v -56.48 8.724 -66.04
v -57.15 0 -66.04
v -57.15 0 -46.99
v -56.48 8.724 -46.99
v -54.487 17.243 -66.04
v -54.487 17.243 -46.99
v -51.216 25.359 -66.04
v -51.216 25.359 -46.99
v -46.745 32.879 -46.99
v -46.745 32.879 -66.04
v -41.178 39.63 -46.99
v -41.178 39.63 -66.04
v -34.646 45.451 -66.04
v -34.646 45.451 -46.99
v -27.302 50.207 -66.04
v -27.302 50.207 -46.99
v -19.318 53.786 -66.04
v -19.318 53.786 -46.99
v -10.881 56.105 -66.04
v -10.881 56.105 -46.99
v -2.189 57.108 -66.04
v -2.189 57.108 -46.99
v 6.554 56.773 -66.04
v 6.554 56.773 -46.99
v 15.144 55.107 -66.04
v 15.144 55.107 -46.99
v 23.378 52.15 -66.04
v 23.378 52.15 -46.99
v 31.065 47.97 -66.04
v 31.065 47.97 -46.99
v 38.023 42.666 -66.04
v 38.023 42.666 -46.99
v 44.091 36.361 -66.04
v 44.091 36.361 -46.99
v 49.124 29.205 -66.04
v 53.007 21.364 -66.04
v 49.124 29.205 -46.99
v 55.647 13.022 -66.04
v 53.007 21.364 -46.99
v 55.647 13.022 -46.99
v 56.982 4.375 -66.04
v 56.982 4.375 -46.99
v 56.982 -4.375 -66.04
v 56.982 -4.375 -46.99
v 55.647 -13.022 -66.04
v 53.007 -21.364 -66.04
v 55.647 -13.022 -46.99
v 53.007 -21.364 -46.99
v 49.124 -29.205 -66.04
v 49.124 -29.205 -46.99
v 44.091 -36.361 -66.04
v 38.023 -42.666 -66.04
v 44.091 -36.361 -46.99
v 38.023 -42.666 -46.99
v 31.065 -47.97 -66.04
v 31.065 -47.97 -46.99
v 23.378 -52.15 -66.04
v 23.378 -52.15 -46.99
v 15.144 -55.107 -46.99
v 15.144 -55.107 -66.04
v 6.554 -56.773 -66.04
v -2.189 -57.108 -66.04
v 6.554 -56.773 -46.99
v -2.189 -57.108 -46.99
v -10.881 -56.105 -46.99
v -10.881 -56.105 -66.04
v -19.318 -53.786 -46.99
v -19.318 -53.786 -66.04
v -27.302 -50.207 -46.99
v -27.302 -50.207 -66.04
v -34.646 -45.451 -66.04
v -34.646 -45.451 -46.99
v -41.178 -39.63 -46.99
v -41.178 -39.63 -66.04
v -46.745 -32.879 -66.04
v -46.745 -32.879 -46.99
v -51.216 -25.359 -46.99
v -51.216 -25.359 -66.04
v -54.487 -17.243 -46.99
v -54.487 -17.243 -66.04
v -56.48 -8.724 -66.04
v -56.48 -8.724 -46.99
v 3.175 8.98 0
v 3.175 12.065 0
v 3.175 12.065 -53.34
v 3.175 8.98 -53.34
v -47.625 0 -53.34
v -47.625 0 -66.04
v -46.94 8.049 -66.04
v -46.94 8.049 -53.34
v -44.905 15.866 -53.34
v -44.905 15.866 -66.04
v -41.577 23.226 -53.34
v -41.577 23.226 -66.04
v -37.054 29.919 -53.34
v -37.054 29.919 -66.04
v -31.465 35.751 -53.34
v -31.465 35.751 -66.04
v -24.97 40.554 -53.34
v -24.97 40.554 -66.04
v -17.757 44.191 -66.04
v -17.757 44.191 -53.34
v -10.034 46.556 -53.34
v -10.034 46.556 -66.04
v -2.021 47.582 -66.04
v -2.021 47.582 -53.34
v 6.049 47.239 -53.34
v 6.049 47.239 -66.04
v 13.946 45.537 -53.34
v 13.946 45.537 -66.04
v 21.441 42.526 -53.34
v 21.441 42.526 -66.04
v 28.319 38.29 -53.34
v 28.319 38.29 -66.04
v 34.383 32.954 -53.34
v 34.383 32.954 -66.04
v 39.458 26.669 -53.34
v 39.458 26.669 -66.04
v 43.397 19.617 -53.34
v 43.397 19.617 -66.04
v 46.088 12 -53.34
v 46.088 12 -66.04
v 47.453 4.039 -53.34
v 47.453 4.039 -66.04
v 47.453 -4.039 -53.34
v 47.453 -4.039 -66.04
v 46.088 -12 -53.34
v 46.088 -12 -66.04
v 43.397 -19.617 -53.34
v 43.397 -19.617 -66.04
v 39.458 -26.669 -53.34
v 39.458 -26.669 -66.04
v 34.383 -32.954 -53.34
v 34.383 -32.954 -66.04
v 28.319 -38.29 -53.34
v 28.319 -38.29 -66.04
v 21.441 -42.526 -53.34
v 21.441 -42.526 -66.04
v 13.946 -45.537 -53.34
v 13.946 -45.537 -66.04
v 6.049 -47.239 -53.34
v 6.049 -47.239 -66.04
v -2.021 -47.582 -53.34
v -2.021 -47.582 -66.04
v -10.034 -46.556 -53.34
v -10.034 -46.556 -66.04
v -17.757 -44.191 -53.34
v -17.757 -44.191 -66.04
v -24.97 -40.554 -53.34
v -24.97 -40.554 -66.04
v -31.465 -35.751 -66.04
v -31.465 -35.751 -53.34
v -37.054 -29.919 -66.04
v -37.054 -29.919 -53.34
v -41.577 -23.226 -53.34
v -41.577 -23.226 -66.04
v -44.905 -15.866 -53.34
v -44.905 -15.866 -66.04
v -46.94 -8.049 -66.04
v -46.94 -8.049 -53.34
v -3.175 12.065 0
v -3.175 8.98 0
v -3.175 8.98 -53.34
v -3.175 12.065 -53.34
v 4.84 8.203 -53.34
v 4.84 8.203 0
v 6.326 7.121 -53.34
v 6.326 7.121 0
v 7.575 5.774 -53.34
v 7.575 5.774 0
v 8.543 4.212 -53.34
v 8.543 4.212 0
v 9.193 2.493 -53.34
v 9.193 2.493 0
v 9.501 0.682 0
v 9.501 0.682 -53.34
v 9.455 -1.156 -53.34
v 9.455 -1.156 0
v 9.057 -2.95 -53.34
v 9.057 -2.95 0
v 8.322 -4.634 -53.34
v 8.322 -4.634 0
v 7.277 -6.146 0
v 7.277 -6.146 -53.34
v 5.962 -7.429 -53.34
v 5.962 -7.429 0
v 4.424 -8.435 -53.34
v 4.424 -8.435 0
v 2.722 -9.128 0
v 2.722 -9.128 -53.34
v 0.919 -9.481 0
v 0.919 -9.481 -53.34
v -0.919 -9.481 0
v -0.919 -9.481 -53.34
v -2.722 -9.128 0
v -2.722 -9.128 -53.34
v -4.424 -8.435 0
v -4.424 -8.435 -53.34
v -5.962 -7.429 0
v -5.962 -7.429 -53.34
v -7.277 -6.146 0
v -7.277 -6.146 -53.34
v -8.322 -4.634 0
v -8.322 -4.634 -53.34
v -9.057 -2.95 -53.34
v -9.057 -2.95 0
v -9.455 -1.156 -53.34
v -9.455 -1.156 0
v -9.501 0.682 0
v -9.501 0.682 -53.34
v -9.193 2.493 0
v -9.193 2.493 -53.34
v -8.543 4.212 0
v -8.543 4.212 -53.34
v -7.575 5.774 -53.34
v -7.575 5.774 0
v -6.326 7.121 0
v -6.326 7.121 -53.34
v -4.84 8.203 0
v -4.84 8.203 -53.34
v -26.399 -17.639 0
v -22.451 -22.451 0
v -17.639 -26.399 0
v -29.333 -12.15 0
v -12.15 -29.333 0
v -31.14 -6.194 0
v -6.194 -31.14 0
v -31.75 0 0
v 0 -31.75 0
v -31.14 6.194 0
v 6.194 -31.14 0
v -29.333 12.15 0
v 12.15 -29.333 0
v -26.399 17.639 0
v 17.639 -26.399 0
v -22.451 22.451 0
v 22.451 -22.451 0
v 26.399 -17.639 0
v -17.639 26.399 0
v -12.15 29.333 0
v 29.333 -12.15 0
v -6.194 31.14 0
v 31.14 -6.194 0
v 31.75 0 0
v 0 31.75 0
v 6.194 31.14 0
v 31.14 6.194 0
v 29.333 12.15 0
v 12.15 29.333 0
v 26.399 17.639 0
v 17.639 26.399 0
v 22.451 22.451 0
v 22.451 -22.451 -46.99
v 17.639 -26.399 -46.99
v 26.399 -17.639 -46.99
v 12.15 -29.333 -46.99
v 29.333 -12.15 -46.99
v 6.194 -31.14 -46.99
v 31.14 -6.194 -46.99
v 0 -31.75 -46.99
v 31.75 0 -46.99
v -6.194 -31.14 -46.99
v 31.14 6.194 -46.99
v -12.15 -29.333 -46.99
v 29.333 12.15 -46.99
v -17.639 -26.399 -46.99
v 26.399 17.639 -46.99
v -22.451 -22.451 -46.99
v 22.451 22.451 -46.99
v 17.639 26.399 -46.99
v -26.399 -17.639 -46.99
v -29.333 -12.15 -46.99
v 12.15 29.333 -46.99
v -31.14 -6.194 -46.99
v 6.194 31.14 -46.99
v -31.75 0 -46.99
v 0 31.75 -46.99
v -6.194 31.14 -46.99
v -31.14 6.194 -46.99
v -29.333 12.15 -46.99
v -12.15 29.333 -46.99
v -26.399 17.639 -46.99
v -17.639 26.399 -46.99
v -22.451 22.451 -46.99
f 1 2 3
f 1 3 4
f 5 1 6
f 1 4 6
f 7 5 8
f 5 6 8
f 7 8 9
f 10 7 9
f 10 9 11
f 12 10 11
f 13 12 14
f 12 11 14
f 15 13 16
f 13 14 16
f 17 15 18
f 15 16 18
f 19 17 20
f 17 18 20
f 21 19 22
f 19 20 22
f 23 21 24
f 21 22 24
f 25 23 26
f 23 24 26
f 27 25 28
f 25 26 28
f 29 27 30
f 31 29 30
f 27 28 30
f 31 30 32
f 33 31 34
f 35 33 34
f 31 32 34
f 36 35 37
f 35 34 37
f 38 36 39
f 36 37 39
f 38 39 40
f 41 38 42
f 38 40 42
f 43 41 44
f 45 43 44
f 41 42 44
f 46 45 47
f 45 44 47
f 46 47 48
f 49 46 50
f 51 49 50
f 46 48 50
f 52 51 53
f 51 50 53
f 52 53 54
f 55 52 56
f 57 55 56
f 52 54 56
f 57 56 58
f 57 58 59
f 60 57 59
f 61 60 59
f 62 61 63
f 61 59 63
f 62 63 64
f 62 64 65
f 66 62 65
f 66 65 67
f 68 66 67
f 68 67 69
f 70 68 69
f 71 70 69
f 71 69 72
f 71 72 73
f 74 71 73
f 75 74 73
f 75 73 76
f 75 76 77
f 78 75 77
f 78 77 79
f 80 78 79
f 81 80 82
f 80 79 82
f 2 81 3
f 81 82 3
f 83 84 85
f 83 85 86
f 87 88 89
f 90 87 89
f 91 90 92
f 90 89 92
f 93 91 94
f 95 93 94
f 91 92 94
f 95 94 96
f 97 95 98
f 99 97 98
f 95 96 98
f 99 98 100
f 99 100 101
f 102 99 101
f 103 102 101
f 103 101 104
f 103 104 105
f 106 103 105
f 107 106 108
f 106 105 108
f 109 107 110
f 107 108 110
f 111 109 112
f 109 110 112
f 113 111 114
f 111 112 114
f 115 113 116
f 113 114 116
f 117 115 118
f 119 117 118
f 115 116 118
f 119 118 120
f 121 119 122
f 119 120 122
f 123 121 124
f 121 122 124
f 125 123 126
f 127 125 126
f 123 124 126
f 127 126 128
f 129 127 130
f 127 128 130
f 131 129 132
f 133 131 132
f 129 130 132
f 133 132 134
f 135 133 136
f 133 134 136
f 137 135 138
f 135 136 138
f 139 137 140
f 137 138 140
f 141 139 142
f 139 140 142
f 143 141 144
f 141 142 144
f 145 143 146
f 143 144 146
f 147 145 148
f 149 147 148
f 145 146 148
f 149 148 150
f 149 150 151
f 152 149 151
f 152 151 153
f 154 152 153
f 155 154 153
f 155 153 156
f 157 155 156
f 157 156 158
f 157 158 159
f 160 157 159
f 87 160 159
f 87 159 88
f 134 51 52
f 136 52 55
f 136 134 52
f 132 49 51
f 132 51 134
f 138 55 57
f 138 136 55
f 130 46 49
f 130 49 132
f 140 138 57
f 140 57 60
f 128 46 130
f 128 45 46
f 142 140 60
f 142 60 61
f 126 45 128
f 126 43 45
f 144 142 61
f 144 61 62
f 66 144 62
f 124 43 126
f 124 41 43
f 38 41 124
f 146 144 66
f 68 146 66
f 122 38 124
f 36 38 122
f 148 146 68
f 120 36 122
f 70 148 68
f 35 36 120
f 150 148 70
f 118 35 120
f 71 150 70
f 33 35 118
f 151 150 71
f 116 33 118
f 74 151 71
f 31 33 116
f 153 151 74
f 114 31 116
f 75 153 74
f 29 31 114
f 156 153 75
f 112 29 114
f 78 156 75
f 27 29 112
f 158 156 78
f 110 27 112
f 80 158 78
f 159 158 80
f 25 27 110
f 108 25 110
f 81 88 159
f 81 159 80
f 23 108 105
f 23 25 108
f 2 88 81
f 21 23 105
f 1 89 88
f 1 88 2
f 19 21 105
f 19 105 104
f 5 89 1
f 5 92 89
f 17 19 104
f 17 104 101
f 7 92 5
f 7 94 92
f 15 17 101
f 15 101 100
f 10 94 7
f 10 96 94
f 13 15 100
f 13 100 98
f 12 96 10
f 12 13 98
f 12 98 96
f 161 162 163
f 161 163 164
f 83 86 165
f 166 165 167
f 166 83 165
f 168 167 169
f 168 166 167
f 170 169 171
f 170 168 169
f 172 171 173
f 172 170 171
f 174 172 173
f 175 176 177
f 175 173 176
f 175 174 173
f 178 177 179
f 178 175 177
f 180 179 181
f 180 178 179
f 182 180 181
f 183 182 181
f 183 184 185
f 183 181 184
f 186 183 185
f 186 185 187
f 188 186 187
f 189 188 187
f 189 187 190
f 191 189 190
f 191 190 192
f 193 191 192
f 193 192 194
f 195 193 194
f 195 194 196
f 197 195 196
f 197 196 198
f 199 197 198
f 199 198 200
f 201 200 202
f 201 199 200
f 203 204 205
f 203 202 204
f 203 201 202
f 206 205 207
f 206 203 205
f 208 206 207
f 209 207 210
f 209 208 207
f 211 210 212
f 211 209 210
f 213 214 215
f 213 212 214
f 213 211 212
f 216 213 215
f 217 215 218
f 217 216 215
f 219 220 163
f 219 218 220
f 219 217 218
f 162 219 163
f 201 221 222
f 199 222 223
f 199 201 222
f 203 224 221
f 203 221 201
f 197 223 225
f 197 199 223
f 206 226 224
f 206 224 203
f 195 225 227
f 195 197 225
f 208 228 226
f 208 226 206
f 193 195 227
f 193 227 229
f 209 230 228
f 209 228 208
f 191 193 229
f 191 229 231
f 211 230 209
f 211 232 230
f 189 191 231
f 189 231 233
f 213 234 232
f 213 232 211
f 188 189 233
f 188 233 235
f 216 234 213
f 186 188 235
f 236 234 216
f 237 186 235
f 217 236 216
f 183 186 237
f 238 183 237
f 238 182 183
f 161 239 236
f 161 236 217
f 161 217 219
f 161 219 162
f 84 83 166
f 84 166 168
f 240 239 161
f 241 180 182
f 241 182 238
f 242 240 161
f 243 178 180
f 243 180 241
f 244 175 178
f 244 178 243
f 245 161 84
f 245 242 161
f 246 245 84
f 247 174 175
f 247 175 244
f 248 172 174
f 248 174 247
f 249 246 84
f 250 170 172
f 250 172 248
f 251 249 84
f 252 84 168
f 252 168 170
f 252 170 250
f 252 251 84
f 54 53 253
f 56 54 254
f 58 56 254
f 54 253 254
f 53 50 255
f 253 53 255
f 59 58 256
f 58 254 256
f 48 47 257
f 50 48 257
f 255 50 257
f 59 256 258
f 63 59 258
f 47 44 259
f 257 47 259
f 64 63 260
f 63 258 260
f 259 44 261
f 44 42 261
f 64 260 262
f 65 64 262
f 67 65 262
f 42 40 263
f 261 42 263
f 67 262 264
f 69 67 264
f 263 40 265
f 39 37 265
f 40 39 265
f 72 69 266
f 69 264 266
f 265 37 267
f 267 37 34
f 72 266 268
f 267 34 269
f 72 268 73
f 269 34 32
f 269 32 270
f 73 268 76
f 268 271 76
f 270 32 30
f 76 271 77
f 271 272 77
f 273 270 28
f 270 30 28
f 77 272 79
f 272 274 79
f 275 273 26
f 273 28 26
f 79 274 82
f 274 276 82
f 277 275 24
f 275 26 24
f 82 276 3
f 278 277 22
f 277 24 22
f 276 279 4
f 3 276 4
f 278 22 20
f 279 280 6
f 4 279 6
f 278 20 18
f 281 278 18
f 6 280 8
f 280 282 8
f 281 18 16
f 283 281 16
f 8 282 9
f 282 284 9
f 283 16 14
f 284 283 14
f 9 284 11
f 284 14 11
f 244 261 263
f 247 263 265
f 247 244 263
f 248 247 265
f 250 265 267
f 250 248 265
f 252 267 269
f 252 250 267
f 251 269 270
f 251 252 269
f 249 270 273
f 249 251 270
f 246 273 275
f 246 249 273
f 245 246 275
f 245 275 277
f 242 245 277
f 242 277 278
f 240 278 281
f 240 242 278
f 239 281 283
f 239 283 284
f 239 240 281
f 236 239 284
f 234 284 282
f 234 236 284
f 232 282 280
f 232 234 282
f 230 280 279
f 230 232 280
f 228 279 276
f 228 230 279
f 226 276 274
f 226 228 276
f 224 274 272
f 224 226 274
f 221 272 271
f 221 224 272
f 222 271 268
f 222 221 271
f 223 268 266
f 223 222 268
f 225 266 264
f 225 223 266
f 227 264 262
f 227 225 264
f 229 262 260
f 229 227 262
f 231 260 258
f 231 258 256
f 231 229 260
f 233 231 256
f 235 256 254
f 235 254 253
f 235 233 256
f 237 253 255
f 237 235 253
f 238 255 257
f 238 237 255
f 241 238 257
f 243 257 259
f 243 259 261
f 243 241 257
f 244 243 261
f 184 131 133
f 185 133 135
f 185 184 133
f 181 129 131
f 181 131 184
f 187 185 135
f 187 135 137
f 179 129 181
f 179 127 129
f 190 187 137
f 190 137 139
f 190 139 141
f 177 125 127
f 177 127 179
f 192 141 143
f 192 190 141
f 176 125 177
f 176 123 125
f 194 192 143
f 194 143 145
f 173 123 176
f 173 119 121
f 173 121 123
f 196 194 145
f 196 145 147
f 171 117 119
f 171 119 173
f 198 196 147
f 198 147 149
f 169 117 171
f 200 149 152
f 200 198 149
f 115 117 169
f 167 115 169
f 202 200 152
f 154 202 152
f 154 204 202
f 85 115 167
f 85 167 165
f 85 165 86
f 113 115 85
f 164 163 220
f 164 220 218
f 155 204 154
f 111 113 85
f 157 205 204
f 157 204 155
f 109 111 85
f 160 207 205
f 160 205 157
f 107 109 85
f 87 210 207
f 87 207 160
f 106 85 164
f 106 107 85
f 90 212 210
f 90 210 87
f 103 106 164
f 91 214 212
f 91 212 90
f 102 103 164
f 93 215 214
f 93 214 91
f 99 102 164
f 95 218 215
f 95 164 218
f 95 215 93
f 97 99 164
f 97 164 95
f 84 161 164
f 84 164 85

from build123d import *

# Parameters (mm, degrees)
SKETCH1_R           = 31.75
BASE_EXTRUDE_DEPTH  = 46.99
SKETCH2_R           = 57.15
BOSS_EXTRUDE1_DEPTH = 19.05
SKETCH4_R           = 47.625
CUT_EXTRUDE1_DEPTH  = 12.7
CUT_EXTRUDE2_DEPTH  = 105.372058521


with BuildPart() as part:
    # Sketch1 → Base-Extrude (new body)
    with BuildSketch(Plane.XY):
        Circle(SKETCH1_R)
    extrude(amount=-BASE_EXTRUDE_DEPTH)

    # Sketch2 → Boss-Extrude1 (add)
    with BuildSketch(Plane(origin=(0, 0, -46.99), x_dir=(-1, 0, 0), z_dir=(0, 0, -1))):
        Circle(SKETCH2_R)
    extrude(amount=BOSS_EXTRUDE1_DEPTH)

    # Sketch4 → Cut-Extrude1 (cut)
    with BuildSketch(Plane(origin=(0, 0, -66.04), x_dir=(-1, 0, 0), z_dir=(0, 0, -1))):
        Circle(SKETCH4_R)
    extrude(amount=-CUT_EXTRUDE1_DEPTH, mode=Mode.SUBTRACT)

    # Sketch6 → Cut-Extrude2 (cut, through all)
    with BuildSketch(Plane.XY):
        with BuildLine():
            Line((-3.175, 12.065), (3.175, 12.065))
            Line((3.175, 12.065), (3.175, 8.980256121))
            ThreePointArc((3.175, 8.980256121), (0, -9.525), (-3.175, 8.980256121))
            Line((-3.175, 8.980256121), (-3.175, 12.065))
        make_face()
    extrude(amount=-CUT_EXTRUDE2_DEPTH, mode=Mode.SUBTRACT)


solid = part.part
